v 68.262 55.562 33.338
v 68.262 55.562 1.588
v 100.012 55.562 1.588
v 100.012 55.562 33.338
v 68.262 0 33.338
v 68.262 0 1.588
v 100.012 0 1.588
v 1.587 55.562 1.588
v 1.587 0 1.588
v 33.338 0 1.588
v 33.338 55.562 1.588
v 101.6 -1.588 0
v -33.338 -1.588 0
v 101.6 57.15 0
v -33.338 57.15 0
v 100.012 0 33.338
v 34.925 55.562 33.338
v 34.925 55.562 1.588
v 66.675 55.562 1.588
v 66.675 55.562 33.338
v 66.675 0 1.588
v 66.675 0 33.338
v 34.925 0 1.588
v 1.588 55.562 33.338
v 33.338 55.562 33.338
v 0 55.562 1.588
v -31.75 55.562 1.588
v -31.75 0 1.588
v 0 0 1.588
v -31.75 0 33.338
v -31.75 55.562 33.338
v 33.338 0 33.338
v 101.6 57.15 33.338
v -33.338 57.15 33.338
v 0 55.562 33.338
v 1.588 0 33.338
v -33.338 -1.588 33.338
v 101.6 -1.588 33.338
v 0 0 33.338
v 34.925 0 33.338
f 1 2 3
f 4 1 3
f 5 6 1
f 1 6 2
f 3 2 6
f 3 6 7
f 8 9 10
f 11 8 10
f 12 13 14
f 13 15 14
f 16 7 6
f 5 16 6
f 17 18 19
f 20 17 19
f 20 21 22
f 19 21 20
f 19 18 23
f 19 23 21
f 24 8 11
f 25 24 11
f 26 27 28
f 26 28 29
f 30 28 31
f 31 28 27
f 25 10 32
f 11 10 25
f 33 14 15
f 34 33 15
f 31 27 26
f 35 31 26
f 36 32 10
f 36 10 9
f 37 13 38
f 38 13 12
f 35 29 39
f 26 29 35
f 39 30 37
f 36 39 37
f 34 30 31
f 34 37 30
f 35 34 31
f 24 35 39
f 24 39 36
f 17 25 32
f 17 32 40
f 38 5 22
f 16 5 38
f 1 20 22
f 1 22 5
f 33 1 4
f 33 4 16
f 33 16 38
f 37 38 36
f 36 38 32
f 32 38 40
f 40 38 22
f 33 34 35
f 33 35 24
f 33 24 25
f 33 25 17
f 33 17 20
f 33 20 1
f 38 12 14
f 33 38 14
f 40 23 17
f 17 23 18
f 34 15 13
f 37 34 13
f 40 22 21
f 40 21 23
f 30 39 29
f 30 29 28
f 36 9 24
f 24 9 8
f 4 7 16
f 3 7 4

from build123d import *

# Parameters (mm, degrees)
F0_W     = 1.5875
F0_H     = 55.5625
F1_DEPTH = 33.3375
F0_W_2   = 31.75
F2_DEPTH = 1.5875


with BuildPart() as f1:
    # F0 (on Top) → F1 (new body)
    with BuildSketch(Plane.XY):
        Polygon((1.5875, 0), (0, 0), (-31.75, 0), (-33.3375, 0), (-33.3375, -1.5875), (101.6, -1.5875), (101.6, 0), (100.0125, 0), (68.2625, 0), (66.675, 0), (34.925, 0), (33.3375, 0), align=None)
        with Locations((-32.54375, 27.78125)):
            Rectangle(F0_W, F0_H)
        Polygon((-31.75, 55.5625), (0, 55.5625), (1.5875, 55.5625), (33.3375, 55.5625), (34.925, 55.5625), (66.675, 55.5625), (68.2625, 55.5625), (100.0125, 55.5625), (101.6, 55.5625), (101.6, 57.15), (-33.3375, 57.15), (-33.3375, 55.5625), align=None)
        with Locations((100.80625, 27.78125)):
            Rectangle(F0_W, F0_H)
        with Locations((0.79375, 27.78125)):
            Rectangle(F0_W, F0_H)
        with Locations((34.13125, 27.78125)):
            Rectangle(F0_W, F0_H)
        with Locations((67.46875, 27.78125)):
            Rectangle(F0_W, F0_H)
    extrude(amount=F1_DEPTH)

    # F0 (on Top) → F2 (join)
    with BuildSketch(Plane.XY):
        with Locations((-15.875, 27.78125)):
            Rectangle(F0_W_2, F0_H)
        with Locations((17.4625, 27.78125)):
            Rectangle(F0_W_2, F0_H)
        with Locations((84.1375, 27.78125)):
            Rectangle(F0_W_2, F0_H)
        with Locations((50.8, 27.78125)):
            Rectangle(F0_W_2, F0_H)
    extrude(amount=F2_DEPTH)


solid = f1.part
